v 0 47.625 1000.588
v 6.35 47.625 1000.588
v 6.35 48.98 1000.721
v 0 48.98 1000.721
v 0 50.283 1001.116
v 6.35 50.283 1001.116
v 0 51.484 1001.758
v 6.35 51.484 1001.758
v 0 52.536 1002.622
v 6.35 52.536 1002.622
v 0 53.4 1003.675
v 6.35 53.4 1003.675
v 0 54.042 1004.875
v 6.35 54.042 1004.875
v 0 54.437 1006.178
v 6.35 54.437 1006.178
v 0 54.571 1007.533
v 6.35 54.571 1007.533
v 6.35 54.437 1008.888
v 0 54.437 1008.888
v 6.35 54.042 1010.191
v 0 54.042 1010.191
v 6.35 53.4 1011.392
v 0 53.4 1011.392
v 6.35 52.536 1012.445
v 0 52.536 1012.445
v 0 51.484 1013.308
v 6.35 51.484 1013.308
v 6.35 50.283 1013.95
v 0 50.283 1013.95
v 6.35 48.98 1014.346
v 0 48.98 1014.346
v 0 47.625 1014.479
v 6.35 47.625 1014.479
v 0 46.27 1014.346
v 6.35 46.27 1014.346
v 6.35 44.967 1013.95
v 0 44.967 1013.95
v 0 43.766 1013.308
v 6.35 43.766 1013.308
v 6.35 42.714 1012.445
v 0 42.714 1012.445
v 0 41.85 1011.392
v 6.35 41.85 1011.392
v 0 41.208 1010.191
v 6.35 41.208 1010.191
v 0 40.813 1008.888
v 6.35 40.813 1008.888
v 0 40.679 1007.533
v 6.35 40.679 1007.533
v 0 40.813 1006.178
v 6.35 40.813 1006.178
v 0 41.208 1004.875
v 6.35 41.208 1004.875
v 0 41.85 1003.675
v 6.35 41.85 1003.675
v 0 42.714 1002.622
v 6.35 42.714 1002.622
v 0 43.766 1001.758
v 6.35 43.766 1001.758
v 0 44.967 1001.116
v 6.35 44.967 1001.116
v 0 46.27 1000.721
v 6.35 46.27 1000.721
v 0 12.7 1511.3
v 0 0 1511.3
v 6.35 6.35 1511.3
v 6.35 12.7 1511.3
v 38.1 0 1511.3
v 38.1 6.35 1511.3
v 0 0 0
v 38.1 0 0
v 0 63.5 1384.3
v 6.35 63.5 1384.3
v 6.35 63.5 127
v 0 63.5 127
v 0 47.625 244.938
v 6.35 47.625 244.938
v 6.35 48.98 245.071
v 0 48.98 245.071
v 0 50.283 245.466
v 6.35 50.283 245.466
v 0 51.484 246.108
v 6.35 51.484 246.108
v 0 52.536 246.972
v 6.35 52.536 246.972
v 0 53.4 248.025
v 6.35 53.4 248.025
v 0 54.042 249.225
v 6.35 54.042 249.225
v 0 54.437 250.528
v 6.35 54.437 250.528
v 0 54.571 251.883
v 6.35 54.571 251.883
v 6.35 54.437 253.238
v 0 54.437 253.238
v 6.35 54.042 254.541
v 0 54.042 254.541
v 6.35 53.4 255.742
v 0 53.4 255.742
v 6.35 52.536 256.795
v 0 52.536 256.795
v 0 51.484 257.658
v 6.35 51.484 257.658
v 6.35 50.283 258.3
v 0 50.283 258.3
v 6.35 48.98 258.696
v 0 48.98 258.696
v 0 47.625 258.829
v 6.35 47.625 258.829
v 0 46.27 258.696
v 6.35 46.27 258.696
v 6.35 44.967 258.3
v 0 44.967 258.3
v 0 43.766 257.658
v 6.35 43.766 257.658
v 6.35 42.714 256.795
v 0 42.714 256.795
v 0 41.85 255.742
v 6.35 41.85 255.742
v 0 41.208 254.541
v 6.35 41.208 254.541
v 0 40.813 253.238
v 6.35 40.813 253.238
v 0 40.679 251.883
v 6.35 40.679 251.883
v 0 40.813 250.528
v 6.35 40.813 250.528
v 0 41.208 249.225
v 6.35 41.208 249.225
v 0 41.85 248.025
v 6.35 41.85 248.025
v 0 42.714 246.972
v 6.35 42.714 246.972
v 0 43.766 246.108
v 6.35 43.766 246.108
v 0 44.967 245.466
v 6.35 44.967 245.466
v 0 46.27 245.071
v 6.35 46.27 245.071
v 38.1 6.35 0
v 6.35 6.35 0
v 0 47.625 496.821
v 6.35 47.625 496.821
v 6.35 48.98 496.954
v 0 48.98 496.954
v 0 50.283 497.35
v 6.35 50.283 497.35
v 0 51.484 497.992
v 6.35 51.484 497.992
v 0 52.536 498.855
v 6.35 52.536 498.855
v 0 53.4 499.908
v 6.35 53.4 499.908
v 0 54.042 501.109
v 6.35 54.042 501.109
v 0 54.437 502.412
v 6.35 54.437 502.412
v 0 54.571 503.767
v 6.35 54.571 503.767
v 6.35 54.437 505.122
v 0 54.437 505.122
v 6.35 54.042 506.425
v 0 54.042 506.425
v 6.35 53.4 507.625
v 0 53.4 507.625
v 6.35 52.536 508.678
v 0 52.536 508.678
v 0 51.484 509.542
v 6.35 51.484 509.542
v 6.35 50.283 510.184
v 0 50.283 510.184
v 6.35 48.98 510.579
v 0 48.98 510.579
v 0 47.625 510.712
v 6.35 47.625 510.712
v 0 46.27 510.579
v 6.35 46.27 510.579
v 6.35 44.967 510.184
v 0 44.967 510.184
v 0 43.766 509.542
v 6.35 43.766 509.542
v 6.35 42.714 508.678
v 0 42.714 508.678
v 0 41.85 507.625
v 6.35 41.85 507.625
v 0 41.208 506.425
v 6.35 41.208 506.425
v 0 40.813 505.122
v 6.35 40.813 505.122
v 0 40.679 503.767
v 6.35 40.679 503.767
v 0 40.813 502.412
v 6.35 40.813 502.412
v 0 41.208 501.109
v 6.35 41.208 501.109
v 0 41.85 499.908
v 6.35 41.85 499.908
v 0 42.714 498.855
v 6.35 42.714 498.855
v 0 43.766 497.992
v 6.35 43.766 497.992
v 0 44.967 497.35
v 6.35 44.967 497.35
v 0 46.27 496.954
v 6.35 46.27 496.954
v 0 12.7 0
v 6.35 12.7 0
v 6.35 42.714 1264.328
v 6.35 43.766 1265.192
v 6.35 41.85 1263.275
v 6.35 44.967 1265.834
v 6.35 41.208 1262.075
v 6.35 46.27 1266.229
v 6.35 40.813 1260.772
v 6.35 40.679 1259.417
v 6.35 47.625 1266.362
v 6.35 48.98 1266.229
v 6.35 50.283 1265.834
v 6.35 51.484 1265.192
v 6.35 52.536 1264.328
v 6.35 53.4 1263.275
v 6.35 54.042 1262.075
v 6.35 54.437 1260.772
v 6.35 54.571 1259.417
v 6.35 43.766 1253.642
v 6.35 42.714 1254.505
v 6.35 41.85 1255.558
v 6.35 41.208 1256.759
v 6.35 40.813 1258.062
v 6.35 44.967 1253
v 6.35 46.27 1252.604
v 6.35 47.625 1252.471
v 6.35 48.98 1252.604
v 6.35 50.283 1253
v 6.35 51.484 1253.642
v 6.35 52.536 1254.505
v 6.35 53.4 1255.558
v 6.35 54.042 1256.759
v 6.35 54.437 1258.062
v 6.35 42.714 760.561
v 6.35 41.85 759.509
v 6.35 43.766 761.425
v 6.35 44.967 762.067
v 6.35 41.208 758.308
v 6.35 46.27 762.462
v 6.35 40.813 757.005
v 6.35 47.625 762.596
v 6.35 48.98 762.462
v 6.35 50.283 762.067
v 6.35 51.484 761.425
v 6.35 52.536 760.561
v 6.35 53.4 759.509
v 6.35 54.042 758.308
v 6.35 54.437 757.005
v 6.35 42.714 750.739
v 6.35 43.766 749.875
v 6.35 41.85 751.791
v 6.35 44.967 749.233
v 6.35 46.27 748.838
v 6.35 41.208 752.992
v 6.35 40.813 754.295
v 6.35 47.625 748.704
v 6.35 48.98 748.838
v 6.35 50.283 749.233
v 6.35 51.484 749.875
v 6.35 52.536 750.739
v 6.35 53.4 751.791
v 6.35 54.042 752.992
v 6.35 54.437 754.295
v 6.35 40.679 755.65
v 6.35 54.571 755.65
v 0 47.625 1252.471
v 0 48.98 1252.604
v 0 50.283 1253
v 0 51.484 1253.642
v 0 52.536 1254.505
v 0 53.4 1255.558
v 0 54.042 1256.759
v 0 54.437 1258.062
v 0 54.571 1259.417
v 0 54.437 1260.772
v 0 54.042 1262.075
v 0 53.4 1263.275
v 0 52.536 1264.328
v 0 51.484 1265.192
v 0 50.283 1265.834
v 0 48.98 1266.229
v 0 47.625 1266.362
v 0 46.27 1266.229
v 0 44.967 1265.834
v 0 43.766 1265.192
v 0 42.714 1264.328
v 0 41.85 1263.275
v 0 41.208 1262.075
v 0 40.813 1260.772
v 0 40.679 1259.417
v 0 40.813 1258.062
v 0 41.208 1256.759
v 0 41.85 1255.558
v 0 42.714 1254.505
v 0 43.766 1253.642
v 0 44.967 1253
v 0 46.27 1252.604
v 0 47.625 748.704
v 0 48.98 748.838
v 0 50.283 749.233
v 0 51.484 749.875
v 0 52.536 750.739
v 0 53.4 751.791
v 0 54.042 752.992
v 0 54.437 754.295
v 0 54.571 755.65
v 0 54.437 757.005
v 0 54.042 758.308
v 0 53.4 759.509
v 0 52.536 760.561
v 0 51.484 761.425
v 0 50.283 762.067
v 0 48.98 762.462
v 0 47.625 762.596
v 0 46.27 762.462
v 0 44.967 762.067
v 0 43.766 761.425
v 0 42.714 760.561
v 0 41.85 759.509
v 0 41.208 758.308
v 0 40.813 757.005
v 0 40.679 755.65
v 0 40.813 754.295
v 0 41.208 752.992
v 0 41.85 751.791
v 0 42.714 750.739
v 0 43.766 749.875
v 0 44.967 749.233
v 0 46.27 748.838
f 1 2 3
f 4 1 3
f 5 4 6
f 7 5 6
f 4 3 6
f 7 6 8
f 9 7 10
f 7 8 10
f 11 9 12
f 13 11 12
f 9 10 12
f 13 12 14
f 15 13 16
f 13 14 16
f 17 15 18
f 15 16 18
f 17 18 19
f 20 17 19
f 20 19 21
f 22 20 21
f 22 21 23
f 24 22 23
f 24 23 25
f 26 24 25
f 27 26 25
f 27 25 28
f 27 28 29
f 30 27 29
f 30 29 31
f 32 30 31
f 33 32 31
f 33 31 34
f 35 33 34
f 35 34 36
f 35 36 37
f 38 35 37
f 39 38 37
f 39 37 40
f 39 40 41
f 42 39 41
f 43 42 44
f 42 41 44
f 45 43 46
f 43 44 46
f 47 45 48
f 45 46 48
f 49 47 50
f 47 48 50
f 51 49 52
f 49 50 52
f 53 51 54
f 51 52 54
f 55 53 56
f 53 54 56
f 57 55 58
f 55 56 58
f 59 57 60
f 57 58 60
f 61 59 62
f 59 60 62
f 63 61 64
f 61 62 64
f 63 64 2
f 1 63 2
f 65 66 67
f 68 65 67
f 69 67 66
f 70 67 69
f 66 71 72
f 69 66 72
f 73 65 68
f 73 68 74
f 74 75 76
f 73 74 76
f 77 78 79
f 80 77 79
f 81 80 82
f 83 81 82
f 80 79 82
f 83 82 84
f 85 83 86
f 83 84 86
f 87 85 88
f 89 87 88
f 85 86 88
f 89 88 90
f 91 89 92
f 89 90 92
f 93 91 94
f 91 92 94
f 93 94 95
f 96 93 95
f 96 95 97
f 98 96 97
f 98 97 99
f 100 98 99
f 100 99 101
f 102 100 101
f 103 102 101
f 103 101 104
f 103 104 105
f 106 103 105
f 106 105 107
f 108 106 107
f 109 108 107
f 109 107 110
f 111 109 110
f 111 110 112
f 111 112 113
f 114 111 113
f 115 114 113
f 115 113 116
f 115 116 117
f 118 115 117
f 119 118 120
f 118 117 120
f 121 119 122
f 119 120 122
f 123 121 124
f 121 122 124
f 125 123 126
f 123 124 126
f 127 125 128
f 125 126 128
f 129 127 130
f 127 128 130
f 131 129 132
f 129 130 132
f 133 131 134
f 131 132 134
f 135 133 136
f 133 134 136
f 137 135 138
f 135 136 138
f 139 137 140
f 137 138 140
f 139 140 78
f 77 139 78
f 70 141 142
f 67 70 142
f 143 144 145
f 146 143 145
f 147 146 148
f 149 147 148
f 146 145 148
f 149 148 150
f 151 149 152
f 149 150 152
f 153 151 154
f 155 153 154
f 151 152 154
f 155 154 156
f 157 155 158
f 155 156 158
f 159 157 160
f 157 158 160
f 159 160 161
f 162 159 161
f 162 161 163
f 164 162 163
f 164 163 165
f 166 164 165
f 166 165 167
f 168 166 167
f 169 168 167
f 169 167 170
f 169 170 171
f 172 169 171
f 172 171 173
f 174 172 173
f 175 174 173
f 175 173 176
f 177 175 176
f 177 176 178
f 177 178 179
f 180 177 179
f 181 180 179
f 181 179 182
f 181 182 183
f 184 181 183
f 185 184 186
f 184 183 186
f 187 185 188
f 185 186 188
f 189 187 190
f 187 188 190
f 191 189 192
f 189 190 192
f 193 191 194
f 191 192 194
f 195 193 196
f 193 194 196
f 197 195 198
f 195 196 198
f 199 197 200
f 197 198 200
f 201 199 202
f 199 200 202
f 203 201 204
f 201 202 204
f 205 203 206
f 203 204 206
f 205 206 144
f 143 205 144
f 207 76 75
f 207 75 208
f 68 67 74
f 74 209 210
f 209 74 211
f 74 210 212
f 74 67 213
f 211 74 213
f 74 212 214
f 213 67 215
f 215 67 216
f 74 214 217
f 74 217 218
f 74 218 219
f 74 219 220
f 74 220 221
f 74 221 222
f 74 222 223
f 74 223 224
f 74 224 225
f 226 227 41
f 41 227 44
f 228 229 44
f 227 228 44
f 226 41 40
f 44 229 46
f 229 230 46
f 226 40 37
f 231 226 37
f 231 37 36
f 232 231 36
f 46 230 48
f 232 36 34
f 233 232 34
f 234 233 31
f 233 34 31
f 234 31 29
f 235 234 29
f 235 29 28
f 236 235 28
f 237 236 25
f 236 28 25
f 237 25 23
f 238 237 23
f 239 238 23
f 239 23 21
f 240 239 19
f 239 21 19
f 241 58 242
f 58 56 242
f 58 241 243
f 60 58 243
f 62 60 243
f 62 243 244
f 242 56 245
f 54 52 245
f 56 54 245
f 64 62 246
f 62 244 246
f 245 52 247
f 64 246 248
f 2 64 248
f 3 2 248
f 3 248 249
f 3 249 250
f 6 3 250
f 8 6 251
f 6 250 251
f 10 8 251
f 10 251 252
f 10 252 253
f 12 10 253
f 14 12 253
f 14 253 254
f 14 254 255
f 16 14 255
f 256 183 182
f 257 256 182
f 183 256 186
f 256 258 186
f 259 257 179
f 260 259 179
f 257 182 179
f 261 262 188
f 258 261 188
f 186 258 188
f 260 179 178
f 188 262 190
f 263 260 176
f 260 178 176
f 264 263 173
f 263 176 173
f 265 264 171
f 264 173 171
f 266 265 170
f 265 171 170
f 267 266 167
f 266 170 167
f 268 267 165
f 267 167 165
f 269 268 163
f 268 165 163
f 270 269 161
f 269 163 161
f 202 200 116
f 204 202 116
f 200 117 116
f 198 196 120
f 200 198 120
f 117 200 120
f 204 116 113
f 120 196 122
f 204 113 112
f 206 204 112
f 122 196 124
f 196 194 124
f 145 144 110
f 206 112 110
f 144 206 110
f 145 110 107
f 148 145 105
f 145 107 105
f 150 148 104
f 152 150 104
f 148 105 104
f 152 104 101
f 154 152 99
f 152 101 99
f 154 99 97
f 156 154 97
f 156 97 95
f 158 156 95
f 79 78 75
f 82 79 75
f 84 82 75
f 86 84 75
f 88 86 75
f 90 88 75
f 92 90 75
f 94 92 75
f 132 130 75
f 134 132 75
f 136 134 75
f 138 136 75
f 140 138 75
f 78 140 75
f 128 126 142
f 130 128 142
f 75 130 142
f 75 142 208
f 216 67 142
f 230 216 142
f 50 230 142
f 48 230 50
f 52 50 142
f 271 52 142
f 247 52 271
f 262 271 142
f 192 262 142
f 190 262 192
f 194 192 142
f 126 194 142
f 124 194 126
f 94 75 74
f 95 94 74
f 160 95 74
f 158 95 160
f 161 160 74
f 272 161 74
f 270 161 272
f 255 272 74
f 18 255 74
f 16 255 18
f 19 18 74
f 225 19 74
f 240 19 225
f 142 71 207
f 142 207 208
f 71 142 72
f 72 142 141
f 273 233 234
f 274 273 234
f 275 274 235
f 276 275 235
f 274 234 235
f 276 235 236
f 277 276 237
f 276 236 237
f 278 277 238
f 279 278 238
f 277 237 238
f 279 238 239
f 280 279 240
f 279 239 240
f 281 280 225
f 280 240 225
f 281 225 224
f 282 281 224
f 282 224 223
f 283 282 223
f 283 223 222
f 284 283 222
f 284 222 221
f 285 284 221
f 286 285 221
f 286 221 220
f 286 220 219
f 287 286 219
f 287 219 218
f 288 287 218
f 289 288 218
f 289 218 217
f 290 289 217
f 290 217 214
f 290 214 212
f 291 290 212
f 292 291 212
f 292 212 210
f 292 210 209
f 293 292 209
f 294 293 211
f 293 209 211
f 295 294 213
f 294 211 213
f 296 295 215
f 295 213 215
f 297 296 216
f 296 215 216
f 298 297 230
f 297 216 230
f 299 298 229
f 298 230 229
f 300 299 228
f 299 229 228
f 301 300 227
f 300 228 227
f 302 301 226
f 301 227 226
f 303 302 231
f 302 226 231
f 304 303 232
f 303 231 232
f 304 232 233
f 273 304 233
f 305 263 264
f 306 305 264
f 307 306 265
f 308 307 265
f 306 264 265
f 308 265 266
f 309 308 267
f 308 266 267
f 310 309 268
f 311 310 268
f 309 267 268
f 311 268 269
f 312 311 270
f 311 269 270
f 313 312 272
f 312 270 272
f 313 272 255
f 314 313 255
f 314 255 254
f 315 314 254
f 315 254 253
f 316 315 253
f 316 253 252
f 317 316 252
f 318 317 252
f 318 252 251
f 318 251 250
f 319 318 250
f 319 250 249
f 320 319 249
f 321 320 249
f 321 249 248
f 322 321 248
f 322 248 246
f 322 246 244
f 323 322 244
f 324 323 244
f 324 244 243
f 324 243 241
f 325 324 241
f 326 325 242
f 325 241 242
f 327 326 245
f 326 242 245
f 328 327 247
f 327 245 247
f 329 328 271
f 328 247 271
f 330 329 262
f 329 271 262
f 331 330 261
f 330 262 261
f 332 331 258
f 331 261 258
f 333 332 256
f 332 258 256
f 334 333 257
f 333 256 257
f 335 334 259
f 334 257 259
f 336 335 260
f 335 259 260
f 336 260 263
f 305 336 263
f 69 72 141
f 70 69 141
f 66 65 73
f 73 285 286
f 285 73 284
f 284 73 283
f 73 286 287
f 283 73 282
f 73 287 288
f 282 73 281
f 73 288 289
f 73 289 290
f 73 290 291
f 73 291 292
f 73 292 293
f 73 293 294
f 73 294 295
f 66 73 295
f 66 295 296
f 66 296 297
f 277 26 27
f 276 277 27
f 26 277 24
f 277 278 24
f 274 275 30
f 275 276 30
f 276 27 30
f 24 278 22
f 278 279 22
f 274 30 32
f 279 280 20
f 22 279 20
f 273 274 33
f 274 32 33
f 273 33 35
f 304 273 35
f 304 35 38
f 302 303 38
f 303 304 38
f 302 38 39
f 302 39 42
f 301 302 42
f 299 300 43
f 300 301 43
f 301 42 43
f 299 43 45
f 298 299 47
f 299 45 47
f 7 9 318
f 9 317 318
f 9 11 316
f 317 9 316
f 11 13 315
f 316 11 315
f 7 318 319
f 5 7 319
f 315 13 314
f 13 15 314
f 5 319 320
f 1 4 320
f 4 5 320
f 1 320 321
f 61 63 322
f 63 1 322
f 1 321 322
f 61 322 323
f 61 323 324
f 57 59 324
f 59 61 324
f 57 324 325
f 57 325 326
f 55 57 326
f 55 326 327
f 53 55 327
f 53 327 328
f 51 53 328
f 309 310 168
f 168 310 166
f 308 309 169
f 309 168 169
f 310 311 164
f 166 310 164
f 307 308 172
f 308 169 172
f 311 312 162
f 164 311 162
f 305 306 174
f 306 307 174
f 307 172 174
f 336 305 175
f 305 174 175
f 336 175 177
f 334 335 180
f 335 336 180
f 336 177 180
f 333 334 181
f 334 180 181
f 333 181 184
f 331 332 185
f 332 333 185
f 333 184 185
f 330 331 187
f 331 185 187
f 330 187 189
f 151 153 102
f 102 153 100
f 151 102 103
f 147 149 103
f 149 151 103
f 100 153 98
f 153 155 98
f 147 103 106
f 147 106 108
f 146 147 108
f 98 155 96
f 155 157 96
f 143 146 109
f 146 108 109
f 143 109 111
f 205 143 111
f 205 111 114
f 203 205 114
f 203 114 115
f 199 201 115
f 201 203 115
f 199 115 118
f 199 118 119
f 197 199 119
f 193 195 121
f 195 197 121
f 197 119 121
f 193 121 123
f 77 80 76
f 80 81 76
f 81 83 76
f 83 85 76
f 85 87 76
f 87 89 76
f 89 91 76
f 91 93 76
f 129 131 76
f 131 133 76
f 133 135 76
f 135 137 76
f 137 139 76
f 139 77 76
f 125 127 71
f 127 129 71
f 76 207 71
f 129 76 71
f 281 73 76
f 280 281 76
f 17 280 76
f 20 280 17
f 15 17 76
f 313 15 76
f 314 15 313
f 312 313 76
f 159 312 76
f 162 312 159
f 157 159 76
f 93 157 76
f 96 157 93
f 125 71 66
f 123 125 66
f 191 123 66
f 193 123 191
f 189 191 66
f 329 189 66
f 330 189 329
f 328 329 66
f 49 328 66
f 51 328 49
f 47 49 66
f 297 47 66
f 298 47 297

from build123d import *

# Parameters (mm, degrees)
EXTRUDE_THIN1_DEPTH         = 1511.3
F_1_2_CLEARANCE_HOLE1_D     = 13.89126
F_1_2_CLEARANCE_HOLE1_DEPTH = 16.51
F_1_2_CLEARANCE_HOLE1_TIP   = 4.173355541
CUT_EXTRUDE1_DEPTH          = 6.35


with BuildPart() as part:
    # Sketch1 → Extrude-Thin1 (new body)
    with BuildSketch(Plane.XY):
        Polygon((0, 63.5), (0, 0), (38.1, 0), (38.1, 6.35), (6.35, 6.35), (6.35, 63.5), align=None)
    extrude(amount=EXTRUDE_THIN1_DEPTH)

    # 1/2 Clearance Hole1
    with Locations(Plane.ZY):
        with Locations((1259.416666667, 47.625), (1007.533333333, 47.625), (755.65, 47.625), (503.766666667, 47.625), (251.883333333, 47.625)):
            Hole(F_1_2_CLEARANCE_HOLE1_D / 2, depth=F_1_2_CLEARANCE_HOLE1_DEPTH)
            with Locations((0, 0, -(F_1_2_CLEARANCE_HOLE1_DEPTH + F_1_2_CLEARANCE_HOLE1_TIP / 2))):  # 118° drill point
                Cone(0, F_1_2_CLEARANCE_HOLE1_D / 2, F_1_2_CLEARANCE_HOLE1_TIP, mode=Mode.SUBTRACT)

    # Sketch4 → Cut-Extrude1 (cut)
    with BuildSketch(Plane.ZY):
        Polygon((1511.3, 12.7), (1384.3, 63.5), (1511.3, 63.5), align=None)
        Polygon((127, 63.5), (0, 12.7), (0, 63.5), align=None)
    extrude(amount=-CUT_EXTRUDE1_DEPTH, mode=Mode.SUBTRACT)


solid = part.part
